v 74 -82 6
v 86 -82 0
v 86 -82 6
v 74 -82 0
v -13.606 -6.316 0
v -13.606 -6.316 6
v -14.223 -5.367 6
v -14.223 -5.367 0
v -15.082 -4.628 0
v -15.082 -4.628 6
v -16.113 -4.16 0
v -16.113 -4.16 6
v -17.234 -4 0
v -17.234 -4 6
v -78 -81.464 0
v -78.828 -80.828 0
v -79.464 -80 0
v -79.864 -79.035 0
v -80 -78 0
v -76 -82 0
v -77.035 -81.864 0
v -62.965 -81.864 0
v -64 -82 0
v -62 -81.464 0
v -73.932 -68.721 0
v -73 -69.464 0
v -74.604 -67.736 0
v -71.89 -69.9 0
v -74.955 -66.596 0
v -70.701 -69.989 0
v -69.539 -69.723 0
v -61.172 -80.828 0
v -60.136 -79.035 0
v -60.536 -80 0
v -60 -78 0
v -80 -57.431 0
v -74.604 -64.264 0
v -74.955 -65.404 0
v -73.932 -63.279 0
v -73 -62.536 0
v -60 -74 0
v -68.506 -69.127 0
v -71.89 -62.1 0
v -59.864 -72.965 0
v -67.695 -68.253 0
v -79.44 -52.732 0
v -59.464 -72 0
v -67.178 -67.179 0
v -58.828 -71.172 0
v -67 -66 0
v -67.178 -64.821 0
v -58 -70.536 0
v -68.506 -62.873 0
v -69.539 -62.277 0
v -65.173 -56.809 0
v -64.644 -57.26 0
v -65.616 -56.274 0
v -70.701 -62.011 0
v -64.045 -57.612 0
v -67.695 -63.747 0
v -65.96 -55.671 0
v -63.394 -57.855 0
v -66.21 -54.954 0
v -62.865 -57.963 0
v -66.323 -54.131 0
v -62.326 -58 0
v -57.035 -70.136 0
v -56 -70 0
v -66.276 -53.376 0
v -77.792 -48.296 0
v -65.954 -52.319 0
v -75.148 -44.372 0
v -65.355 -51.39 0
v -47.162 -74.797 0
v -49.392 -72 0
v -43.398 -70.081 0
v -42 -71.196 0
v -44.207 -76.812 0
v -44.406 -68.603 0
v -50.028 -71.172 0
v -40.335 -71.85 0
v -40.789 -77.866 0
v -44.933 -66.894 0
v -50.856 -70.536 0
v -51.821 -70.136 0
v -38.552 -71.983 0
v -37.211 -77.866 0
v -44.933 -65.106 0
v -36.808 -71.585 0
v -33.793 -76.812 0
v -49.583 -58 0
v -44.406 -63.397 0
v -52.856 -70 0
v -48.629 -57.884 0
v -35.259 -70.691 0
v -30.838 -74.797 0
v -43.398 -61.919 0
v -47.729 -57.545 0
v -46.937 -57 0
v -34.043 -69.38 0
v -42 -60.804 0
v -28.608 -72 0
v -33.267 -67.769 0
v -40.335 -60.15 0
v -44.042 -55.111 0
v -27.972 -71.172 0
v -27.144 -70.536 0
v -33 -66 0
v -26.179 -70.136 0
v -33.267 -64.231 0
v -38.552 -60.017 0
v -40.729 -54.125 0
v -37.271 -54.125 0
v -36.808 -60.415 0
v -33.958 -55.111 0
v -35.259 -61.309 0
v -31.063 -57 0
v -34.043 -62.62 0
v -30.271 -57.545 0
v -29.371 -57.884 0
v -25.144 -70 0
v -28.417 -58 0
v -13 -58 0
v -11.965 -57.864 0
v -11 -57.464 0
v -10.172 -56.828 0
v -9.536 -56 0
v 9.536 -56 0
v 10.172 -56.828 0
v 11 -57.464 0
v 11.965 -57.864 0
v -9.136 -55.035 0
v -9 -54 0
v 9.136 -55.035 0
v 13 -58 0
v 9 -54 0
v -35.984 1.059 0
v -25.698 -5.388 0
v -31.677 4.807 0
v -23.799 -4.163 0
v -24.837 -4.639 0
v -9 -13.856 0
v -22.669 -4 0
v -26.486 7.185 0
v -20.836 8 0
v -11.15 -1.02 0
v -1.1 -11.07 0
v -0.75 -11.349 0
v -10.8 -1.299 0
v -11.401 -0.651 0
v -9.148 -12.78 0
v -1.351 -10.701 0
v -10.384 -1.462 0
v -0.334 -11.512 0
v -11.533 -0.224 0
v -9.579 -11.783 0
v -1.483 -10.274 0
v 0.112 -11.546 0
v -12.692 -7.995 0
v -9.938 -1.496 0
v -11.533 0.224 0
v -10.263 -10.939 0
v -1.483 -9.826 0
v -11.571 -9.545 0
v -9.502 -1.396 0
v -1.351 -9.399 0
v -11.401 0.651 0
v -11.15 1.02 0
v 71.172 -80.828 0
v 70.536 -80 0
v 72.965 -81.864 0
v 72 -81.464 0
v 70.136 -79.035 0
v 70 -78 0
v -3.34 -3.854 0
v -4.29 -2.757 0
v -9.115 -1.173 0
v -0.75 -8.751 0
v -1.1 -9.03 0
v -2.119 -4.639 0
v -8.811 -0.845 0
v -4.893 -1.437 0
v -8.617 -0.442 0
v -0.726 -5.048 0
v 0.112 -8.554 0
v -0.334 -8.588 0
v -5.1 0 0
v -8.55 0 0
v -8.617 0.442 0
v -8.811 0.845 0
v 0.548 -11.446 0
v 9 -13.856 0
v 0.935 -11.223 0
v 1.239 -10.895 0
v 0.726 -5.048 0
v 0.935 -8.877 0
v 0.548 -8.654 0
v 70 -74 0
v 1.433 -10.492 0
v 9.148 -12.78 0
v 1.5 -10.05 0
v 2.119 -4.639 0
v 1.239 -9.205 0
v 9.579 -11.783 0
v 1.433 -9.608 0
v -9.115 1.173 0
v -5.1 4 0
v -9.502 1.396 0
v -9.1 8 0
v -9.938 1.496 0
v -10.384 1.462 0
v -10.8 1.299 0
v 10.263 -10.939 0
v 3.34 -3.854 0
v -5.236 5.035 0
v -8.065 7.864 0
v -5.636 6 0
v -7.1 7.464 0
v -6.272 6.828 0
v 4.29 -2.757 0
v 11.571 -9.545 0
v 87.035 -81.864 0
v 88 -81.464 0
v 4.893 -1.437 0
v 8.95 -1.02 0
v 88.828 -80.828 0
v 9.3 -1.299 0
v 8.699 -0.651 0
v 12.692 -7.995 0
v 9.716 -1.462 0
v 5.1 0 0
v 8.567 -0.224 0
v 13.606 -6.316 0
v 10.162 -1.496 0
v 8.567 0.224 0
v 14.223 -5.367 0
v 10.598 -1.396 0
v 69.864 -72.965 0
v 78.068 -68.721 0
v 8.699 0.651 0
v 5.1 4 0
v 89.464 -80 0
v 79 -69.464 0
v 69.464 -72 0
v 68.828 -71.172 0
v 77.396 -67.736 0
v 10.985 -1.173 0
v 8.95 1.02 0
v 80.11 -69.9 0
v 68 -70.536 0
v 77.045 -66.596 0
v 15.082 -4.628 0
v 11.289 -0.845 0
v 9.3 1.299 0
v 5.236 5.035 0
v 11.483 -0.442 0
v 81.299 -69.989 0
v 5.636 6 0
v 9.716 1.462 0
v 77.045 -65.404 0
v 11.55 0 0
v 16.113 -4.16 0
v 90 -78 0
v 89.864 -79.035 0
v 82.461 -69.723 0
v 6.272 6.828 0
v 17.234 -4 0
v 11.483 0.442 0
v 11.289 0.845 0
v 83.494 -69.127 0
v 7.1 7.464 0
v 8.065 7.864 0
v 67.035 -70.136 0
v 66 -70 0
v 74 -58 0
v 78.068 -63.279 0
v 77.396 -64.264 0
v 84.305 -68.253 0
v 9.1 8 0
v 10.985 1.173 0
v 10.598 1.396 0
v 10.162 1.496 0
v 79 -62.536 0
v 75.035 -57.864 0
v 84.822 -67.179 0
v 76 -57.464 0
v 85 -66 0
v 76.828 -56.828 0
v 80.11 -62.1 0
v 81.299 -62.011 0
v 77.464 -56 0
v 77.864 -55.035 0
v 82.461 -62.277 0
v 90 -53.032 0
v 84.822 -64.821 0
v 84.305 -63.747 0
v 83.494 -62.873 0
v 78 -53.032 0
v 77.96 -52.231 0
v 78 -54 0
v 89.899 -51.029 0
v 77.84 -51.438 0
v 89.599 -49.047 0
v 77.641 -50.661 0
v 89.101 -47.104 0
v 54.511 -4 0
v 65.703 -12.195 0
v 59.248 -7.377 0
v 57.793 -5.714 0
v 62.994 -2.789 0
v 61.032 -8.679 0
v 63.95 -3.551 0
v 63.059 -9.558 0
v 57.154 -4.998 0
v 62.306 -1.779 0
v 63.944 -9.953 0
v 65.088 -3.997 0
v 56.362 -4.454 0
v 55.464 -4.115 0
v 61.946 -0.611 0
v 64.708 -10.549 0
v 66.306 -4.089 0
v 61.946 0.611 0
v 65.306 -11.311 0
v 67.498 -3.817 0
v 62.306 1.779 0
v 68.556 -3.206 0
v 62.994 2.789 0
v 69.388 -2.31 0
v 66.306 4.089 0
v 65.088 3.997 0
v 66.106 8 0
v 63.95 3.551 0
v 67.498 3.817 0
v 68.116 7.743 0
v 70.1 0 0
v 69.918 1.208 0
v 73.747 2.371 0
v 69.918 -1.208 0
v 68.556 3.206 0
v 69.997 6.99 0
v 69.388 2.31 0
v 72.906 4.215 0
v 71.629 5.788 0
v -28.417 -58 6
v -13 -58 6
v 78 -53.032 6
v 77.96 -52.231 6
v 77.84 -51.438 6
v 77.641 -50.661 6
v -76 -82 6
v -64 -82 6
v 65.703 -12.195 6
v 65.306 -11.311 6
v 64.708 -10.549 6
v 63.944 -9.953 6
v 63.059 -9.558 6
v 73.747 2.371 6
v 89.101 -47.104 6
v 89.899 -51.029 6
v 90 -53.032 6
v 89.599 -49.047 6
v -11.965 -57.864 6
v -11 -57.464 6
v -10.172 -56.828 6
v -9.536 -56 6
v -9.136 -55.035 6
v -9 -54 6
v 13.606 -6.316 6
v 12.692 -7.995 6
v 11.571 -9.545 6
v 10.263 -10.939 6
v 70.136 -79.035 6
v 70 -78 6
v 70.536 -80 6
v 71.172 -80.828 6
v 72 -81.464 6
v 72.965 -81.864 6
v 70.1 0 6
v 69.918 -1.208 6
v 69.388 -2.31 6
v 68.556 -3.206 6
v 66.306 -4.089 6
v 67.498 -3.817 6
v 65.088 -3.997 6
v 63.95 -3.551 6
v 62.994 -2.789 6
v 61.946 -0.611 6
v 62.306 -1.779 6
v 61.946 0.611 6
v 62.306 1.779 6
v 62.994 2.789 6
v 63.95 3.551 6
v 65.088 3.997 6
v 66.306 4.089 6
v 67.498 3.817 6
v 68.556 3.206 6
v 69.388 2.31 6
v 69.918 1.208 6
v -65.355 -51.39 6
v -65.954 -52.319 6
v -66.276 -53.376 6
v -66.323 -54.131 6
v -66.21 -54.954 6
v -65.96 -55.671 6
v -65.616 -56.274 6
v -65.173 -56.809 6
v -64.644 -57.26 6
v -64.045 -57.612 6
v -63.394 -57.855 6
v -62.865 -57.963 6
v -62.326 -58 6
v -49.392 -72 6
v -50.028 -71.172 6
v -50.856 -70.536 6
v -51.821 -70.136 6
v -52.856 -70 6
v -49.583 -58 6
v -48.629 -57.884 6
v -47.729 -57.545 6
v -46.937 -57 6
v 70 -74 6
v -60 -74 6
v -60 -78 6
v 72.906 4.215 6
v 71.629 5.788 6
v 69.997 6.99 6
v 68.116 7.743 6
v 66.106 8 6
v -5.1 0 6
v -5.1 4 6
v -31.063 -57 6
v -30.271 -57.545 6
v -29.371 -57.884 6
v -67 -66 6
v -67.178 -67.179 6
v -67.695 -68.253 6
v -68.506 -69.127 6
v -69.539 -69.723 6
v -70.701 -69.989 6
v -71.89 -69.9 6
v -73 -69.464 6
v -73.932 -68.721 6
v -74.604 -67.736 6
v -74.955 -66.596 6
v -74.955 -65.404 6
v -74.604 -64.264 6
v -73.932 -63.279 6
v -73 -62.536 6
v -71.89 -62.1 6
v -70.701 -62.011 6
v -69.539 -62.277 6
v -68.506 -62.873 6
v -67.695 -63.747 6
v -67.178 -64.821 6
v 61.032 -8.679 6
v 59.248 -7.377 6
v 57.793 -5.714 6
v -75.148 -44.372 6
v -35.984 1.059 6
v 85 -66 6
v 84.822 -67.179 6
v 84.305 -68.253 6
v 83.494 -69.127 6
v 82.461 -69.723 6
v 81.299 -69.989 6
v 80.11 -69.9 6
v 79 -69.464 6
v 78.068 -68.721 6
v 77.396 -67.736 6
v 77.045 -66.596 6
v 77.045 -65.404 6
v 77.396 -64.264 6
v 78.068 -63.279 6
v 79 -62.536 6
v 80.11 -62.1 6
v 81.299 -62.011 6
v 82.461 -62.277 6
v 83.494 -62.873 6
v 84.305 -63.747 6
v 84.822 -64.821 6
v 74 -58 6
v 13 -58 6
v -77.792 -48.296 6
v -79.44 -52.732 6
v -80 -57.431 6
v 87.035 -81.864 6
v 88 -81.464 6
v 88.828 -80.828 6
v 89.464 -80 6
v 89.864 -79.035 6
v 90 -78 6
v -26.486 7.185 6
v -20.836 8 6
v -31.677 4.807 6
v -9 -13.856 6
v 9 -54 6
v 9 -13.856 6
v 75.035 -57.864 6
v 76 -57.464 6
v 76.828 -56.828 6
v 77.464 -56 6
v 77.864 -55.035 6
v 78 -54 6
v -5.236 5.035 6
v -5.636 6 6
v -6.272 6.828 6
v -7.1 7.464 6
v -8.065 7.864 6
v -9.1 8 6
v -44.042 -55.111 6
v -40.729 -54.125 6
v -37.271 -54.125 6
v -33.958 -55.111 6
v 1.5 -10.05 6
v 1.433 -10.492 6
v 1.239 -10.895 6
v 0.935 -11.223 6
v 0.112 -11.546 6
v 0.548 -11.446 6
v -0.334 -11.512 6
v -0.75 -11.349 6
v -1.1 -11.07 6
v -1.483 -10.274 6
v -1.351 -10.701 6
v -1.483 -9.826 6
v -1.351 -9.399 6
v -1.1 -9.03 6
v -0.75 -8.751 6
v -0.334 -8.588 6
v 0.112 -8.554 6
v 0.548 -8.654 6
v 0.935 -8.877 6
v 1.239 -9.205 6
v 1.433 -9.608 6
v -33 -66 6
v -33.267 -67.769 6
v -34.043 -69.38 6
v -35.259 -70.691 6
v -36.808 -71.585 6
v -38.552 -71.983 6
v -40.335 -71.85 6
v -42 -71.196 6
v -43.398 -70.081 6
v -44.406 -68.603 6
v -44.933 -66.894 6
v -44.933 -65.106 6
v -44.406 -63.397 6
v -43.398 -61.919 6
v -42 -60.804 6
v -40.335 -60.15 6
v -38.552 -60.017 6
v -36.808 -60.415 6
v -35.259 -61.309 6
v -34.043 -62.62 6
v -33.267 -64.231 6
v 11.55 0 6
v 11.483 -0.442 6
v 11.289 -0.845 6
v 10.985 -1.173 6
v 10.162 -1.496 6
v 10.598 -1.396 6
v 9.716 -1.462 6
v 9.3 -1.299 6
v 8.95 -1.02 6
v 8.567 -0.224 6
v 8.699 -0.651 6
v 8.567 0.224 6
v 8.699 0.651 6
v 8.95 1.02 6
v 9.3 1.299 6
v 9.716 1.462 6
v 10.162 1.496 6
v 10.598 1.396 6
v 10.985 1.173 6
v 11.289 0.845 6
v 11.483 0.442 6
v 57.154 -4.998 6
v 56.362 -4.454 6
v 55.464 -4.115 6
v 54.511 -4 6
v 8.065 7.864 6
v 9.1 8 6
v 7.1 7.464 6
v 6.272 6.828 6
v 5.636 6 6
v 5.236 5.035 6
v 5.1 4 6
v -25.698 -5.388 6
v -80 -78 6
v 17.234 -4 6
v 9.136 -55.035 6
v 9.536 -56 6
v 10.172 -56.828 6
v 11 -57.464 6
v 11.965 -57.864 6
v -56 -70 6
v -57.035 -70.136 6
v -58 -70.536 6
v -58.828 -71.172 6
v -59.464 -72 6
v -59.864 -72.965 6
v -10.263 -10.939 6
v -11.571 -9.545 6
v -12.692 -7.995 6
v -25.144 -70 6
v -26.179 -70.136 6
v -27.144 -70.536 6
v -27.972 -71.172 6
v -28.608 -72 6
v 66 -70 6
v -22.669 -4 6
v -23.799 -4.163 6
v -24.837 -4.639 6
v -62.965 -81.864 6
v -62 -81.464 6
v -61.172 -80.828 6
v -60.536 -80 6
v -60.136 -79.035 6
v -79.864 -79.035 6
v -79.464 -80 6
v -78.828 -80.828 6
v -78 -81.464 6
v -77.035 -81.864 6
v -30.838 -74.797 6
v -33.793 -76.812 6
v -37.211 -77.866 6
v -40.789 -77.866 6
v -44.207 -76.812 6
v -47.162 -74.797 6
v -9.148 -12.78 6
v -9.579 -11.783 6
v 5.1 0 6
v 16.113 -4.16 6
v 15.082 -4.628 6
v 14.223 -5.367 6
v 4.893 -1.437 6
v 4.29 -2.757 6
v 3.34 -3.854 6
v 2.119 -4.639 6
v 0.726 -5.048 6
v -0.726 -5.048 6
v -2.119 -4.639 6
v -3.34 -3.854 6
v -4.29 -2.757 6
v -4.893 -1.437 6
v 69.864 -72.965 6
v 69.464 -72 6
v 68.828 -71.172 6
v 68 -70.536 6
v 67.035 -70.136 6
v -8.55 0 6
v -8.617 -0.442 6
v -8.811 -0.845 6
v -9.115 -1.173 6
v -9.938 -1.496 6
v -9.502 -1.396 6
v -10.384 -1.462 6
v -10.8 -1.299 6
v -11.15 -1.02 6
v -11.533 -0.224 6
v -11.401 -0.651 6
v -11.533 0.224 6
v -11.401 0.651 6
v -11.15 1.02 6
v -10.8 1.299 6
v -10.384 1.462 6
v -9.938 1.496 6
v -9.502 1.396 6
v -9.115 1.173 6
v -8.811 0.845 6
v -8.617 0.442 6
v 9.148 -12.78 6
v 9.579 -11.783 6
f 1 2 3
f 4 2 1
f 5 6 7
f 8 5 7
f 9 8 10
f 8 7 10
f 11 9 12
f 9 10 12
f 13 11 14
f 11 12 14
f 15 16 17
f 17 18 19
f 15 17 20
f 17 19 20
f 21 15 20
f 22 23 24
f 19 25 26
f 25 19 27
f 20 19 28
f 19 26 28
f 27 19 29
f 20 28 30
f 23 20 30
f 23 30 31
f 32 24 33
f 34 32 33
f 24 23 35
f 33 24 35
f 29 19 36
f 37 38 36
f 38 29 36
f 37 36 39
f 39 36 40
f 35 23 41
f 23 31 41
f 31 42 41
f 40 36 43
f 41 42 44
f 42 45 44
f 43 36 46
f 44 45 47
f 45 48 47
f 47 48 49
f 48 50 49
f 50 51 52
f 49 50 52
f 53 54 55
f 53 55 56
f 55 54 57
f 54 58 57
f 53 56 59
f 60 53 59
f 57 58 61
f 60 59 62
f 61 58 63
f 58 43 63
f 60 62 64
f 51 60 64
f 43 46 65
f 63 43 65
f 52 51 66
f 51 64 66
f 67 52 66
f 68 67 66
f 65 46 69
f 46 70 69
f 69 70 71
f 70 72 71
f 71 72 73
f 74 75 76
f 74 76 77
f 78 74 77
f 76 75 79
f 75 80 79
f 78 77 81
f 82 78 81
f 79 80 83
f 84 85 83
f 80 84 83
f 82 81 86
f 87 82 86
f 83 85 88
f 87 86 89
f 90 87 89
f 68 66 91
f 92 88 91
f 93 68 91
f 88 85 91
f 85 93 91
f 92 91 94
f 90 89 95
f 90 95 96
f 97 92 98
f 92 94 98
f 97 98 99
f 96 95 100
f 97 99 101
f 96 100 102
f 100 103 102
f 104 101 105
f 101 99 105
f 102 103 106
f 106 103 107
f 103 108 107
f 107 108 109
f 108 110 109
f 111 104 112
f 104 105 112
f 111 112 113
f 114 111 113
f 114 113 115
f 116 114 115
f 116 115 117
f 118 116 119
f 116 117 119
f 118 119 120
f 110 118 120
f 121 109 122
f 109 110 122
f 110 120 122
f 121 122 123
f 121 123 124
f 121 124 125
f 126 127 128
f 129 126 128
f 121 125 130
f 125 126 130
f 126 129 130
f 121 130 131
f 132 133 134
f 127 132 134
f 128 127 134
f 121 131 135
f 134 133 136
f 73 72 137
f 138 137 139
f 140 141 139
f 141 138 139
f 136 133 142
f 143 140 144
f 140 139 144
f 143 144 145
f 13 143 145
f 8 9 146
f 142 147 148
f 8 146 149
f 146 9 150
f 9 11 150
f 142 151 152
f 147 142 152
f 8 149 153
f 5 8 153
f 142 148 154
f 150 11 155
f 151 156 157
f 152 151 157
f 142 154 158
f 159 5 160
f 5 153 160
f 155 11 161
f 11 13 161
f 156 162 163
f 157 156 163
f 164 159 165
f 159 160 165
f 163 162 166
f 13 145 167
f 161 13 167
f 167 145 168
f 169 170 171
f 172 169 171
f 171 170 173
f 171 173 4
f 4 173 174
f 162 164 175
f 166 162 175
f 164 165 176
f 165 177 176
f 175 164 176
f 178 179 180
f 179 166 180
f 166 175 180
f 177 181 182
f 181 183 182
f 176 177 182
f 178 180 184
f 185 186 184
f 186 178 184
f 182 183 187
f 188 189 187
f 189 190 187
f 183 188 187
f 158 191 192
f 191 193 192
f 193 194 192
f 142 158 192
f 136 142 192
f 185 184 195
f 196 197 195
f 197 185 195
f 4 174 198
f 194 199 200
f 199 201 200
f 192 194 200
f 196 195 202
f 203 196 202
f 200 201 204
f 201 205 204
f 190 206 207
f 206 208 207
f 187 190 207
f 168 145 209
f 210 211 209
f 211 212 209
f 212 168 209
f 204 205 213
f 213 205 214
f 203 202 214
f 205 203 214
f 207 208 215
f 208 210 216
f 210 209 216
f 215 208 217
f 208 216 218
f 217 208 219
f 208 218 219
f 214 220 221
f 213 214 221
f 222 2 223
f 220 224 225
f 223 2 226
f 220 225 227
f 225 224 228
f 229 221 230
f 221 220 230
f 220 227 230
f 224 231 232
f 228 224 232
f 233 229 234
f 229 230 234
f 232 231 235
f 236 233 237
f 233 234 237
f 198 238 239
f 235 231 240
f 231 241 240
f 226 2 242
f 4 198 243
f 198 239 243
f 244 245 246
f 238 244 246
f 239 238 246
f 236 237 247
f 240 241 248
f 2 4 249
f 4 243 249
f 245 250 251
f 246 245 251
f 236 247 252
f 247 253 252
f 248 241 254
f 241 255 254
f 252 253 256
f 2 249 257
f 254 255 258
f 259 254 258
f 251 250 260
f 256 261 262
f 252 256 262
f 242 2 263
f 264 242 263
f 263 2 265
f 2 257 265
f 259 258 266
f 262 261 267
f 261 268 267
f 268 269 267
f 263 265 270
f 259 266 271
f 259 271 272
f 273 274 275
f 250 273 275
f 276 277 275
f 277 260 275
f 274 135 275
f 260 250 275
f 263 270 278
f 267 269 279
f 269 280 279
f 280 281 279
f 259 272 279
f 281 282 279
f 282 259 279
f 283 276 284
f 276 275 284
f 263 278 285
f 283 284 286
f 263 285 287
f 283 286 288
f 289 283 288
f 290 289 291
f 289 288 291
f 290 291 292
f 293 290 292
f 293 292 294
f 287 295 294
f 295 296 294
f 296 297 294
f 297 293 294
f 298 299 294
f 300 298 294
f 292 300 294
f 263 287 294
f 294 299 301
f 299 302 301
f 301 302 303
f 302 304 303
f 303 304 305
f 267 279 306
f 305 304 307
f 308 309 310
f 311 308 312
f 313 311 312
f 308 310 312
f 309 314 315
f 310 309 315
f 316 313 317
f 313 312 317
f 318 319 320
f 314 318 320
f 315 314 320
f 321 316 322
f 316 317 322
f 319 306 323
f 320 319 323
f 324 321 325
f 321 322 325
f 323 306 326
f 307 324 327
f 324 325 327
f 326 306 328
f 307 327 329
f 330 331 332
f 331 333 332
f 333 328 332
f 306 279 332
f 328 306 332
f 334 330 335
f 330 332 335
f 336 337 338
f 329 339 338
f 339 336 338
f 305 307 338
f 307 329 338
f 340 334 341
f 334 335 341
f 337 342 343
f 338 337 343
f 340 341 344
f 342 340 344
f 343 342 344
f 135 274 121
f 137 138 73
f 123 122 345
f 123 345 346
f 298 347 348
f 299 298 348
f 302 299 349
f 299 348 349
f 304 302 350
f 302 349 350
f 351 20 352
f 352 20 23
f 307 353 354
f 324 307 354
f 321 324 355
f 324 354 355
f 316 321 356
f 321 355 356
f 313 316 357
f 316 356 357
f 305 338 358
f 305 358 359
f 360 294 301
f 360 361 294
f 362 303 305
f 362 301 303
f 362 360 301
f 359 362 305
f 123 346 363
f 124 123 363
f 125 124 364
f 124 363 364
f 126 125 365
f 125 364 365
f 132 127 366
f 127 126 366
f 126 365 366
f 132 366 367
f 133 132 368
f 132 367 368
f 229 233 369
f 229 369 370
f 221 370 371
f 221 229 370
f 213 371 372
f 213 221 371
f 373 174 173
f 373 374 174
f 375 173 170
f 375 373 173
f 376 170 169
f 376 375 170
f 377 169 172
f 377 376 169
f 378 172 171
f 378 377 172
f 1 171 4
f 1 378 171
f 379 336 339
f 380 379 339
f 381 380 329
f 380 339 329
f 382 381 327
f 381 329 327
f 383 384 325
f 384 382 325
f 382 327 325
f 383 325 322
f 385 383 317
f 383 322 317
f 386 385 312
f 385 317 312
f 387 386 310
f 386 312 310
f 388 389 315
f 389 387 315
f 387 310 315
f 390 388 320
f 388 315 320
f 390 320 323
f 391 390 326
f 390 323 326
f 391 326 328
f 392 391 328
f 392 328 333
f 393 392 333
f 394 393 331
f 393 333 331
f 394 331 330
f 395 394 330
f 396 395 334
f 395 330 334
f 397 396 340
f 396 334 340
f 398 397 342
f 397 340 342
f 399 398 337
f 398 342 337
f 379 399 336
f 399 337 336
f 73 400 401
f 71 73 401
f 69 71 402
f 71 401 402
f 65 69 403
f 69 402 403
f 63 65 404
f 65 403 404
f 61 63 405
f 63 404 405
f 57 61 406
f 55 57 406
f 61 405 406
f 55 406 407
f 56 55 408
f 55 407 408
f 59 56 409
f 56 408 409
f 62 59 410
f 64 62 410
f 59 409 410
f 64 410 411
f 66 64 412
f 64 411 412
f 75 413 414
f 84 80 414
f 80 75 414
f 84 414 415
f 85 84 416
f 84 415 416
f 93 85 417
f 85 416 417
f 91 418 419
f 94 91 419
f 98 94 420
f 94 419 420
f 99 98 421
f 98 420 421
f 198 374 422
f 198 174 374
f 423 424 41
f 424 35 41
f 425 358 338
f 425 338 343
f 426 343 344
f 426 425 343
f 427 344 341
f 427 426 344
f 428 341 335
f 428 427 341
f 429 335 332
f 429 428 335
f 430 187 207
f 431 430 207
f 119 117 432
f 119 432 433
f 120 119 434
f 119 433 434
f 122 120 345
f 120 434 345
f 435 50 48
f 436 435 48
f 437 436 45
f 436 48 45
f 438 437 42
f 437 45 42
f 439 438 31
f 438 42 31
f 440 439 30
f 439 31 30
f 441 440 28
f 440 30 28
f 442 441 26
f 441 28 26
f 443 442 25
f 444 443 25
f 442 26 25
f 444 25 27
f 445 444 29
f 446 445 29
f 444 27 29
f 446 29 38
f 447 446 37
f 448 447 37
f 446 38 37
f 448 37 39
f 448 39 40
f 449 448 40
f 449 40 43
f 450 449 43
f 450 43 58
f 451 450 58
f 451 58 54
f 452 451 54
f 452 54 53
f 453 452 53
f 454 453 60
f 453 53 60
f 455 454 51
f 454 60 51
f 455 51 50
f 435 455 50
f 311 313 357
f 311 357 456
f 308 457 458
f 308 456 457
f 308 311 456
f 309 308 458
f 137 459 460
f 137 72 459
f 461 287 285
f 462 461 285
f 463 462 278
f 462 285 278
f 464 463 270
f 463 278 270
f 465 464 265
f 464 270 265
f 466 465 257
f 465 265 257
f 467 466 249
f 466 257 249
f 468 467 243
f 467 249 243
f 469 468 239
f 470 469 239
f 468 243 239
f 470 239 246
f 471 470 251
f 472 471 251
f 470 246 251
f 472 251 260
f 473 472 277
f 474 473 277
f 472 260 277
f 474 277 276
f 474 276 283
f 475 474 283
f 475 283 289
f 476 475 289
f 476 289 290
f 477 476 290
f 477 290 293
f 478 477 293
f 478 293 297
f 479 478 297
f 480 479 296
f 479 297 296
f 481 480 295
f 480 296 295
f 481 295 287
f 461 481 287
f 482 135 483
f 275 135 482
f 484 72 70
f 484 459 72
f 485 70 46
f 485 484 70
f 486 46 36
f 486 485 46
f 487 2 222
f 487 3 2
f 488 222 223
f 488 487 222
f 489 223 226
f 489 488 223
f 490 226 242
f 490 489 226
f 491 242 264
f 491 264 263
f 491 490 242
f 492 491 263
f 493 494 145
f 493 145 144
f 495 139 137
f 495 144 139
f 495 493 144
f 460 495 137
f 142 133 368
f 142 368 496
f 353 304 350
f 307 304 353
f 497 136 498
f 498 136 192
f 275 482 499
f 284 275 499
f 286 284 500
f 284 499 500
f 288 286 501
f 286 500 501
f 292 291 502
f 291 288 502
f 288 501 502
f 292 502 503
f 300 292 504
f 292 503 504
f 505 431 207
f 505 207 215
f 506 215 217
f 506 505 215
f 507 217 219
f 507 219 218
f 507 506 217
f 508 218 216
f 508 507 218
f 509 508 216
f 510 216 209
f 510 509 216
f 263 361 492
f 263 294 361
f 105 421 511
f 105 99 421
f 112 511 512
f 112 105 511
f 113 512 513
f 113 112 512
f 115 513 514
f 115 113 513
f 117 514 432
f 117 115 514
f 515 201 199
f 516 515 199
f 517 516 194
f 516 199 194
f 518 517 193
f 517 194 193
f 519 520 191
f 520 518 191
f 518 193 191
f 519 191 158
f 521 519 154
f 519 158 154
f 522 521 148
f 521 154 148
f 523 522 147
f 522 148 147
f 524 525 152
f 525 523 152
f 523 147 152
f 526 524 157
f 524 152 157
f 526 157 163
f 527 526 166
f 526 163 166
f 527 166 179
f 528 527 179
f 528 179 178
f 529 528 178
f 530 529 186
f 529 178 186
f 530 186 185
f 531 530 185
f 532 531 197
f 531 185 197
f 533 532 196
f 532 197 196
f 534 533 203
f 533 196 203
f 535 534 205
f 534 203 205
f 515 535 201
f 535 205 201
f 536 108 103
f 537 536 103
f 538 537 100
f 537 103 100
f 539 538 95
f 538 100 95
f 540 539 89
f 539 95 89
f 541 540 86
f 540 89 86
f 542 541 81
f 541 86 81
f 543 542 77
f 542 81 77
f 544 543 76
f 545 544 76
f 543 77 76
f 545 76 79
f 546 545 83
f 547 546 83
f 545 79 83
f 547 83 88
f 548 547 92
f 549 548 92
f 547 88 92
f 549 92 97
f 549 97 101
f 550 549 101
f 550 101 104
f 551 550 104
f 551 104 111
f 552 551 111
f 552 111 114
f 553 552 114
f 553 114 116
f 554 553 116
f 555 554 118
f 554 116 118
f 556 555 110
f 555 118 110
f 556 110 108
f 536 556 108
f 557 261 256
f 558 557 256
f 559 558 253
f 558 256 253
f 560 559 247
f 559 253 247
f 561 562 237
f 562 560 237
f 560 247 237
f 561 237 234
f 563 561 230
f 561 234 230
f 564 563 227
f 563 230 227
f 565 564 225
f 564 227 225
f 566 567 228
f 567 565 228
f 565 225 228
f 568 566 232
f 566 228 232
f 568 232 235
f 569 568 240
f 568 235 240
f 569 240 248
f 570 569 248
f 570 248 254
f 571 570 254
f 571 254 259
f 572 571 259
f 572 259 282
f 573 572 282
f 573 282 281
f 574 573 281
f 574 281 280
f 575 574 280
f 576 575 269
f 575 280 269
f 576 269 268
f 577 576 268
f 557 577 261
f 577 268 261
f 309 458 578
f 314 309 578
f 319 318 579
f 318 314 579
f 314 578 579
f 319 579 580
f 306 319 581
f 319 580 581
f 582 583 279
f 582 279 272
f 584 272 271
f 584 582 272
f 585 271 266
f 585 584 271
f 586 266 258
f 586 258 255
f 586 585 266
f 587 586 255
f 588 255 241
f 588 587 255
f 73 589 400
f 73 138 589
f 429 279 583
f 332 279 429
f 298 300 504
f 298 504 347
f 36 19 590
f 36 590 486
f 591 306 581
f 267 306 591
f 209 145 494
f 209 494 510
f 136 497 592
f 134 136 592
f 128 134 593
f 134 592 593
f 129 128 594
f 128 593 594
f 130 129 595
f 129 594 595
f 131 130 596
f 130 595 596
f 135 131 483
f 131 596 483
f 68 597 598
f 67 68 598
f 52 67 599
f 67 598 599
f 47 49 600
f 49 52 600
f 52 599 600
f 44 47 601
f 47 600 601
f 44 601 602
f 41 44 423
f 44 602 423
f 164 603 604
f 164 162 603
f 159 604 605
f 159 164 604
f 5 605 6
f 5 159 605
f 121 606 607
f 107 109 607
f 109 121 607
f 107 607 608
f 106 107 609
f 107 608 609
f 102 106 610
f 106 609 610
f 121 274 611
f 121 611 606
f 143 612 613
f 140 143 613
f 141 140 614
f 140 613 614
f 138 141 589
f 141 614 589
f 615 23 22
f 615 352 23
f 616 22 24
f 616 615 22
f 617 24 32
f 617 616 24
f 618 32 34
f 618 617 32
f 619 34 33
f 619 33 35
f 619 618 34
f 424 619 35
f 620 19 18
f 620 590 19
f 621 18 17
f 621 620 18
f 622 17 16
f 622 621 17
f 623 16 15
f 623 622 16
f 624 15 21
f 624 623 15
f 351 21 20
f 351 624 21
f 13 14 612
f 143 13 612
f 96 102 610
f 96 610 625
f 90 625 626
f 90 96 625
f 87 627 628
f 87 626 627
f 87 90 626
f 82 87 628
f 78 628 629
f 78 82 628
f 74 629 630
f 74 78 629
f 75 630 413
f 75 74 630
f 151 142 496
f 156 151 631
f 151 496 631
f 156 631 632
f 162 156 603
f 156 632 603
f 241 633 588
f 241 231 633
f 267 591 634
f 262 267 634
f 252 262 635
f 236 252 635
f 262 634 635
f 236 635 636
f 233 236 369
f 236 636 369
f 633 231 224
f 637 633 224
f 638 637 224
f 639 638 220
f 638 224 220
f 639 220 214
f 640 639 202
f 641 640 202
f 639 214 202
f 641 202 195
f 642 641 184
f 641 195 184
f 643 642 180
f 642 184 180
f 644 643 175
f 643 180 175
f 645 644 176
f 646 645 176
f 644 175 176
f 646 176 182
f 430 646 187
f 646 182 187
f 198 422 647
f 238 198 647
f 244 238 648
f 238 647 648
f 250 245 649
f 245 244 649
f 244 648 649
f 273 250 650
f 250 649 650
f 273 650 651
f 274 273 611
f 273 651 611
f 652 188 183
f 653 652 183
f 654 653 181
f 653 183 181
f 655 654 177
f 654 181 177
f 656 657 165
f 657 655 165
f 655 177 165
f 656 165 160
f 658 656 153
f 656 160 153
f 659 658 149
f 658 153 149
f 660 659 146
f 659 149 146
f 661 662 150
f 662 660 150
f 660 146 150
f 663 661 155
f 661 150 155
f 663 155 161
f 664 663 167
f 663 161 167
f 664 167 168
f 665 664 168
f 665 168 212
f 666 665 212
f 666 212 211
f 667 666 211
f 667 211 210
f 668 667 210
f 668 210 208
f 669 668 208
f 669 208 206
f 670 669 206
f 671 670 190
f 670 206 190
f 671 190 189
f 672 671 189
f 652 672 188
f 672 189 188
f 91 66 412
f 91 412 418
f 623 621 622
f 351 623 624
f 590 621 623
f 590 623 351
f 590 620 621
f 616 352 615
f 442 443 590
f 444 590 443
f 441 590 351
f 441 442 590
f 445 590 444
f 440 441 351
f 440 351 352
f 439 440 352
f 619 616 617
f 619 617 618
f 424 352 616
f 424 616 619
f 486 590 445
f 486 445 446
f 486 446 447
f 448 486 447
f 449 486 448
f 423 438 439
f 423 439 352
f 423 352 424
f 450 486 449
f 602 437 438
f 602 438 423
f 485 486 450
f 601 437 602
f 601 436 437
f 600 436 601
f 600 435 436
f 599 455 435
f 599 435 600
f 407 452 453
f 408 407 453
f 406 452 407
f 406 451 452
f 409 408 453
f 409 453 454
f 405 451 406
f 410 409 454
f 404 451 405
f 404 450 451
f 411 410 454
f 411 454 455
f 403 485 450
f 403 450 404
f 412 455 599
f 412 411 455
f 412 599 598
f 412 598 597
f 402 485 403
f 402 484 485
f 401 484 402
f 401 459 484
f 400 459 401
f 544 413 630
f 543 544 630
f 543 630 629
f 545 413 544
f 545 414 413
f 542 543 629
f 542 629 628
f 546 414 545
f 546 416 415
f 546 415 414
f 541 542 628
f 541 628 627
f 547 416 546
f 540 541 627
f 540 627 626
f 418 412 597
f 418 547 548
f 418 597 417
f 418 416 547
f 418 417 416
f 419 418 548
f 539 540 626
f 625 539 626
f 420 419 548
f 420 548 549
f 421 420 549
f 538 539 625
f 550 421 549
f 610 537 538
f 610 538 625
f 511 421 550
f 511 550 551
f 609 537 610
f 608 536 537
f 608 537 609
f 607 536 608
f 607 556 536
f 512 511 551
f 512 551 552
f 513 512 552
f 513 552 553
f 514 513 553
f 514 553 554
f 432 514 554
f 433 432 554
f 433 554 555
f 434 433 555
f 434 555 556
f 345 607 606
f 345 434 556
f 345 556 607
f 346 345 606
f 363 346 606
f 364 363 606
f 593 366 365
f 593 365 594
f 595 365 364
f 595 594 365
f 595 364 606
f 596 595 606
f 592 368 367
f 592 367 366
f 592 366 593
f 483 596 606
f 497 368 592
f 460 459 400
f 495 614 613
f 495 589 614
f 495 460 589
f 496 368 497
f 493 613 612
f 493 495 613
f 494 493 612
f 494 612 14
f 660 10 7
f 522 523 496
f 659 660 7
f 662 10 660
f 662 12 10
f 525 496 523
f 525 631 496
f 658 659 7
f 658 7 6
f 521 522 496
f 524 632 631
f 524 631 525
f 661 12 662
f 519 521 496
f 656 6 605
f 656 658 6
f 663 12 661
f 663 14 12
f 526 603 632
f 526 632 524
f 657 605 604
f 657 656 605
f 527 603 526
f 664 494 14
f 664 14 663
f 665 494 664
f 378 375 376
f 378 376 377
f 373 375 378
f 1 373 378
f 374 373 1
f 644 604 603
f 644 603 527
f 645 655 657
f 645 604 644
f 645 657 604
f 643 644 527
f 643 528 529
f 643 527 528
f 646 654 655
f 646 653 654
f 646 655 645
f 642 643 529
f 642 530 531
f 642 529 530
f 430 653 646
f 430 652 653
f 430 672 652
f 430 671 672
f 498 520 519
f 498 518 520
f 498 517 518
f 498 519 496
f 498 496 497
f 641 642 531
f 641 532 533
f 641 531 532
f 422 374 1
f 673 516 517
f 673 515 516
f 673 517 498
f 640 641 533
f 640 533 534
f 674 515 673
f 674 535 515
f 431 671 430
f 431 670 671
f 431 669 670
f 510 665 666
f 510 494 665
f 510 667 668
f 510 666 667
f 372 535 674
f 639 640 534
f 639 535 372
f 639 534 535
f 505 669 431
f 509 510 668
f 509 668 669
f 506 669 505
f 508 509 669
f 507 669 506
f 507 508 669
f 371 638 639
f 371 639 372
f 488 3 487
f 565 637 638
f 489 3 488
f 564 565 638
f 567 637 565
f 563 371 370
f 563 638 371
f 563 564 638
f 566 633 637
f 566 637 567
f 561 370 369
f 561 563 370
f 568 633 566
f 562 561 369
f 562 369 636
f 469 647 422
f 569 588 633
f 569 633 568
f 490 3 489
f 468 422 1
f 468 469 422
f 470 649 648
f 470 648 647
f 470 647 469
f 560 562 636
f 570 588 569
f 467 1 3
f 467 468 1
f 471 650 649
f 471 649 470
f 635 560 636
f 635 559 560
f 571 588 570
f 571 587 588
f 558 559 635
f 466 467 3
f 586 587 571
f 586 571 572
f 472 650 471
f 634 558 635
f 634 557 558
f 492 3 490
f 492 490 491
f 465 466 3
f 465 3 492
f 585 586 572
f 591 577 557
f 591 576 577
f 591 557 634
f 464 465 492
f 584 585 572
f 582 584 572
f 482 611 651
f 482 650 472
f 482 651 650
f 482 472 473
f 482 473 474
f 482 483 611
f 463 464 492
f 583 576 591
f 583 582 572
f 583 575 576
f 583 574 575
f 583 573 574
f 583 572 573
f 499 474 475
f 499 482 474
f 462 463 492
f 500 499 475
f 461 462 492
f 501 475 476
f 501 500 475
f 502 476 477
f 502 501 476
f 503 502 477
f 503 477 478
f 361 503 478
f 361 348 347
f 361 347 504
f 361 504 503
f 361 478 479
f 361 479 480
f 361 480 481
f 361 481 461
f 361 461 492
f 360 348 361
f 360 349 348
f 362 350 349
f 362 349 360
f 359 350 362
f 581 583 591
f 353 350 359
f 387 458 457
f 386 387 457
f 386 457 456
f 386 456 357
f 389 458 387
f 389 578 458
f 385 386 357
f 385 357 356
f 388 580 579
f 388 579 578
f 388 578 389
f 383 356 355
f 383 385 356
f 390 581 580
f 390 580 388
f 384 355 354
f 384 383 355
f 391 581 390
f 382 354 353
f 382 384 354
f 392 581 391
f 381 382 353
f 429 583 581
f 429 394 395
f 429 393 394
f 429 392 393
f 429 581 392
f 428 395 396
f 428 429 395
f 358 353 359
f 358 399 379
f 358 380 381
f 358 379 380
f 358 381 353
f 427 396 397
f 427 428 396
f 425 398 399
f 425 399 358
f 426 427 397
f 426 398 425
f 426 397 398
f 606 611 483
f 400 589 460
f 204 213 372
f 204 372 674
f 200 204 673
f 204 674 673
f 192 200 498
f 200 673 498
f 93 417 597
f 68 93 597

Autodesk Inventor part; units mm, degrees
ref_plane "YZ Plane" through (0, 0, 0) normal (1, 0, 0) x (0, 1, 0)
ref_plane "XZ Plane" through (0, 0, 0) normal (0, 1, 0) x (-1, 0, 0)
ref_plane "XY Plane" through (0, 0, 0) normal (0, 0, 1) x (1, 0, 0)
sketch "Эскиз1" plane through (0, 0, 0) normal (0, 0, 1) x (1, 0, 0)
  circle A0 centre (0, 0) radius 60 construction
  line L0 (-80, -70) -> (-80, -50)
  line L1 (-80, -50) -> (-30, 8)
  line L2 (-30, 8) -> (72, 8)
  line L3 (72, 8) -> (90, -50)
  line L4 (90, -50) -> (90, -70)
  line L5 (90, -70) -> (-80, -70)
  line L6 (0, -110.4) -> (0, 88.4) construction
  line L7 (-115.4, 0) -> (132.4, 0) construction
  line L8 (-80, -50) -> (90, -50) construction
  circle A1 centre (67, -35) radius 12.5 construction
  circle A2 centre (0, 0) radius 5.1
  circle A3 centre (66, 0) radius 4.1
  circle A4 centre (67, -35) radius 4
  circle A5 centre (67, -35) radius 8.5 construction
  line L9 (67, -49.1463) -> (67, -22.5) construction
  circle A6 centre (67, -43.5) radius 1.6
  circle A7 centre (67, -26.5) radius 1.6
  line L10 (-24.5014, -4) -> (-68, -54.4584)
  line L11 (-68, -54.4584) -> (-68, -58)
  line L12 (-68, -58) -> (78, -58)
  line L13 (78, -58) -> (78, -51.8193)
  line L14 (78, -51.8193) -> (63.1595, -4)
  line L15 (63.1595, -4) -> (-24.5014, -4)
  arc A8 (-3.5925, -14.5634) -> (14.4568, -4) centre (0, 0) ccw
  arc A9 (-14.4568, -4) -> (-3.5925, -14.5634) centre (0, 0) ccw
  arc A10 (14.4568, -4) -> (-14.4568, -4) centre (0, 0) ccw construction
  line L16 (-9, -58) -> (-9, -12)
  line L17 (9, -58) -> (9, -12)
  arc A11 (65.0062, -9.9505) -> (56.8348, -4) centre (66, 0) ccw construction
  line L18 (68.4354, -21) -> (58.4354, -21)
  line L19 (58.4354, -21) -> (47.8258, -58)
  arc A12 (56.8348, -4) -> (65.0062, -9.9505) centre (66, 0) ccw
  line L20 (-80, -70) -> (-80, -82)
  line L21 (-80, -82) -> (-60, -82)
  line L22 (-60, -82) -> (-60, -70)
  line L23 (90, -70) -> (90, -82)
  line L24 (90, -82) -> (70, -82)
  line L25 (70, -82) -> (70, -70)
  circle A13 centre (-71, -66) radius 4
  circle A14 centre (81, -66) radius 4
  line L26 (-80, -66) -> (90, -66) construction
  line L27 (-5.1, 0) -> (-5.1, 8)
  line L28 (5.1, 0) -> (5.1, 8)
  circle A15 centre (37.4657, -40.2656) radius 6
  circle A16 centre (37.4657, -40.2656) radius 12
  circle A17 centre (67, -35) radius 30 construction
  circle A18 centre (0, 0) radius 55 construction
  line L29 (9, -40.2656) -> (74.4144, -40.2656) construction
  line L30 (9, -47.2656) -> (50.9039, -47.2656)
  line L31 (9, -33.2656) -> (54.9183, -33.2656)
  line L32 (69.7458, -32.0913) -> (70, -32.0913)
  circle A19 centre (0, 0) radius 10.05 construction
  circle A20 centre (-10.05, 0) radius 1.5
  circle A21 centre (10.05, 0) radius 1.5
  circle A22 centre (0, -10.05) radius 1.5
  circle A23 centre (-39, -66) radius 12
  circle A24 centre (-39, -66) radius 6
  point P0 (56.8348, -4)
  point P1 (65.0062, -9.9505)
  point P2 (59.5152, -7.6123)
  point P3 (27.7189, -33.2656)
  point P4 (27.7189, -47.2656)
  point P5 (47.2125, -47.2656)
  point P6 (47.2125, -33.2656)
  point P7 (3.1639, -4)
  point P8 (-3.1639, -4)
  point P9 (-27.6863, -70)
  point P10 (-50.3137, -70)
  point P11 (-30.0557, -58)
  point P12 (-47.9443, -58)
  dimension "d0" = 120
  dimension "d1" = 25
  dimension "d14" = 8
  dimension "d44" = 60
  dimension "d45" = 110
  dimension "d2" = 10.2
  dimension "d3" = 8
  dimension "d5" = 20
  dimension "d6" = 70
  dimension "d8" = 30
  dimension "d9" = 72
  dimension "d10" = 8.2
  dimension "d11" = 66
  dimension "d12" = 80
  dimension "d13" = 90
  dimension "d15" = 35
  dimension "d17" = 17
  dimension "d19" = 3.2
  dimension "d20" = 67
  dimension "d25" = 12
  dimension "d26" = 30
  dimension "d27" = 9
  dimension "d28" = 9
  dimension "d29" = 20
  dimension "d31" = 21
  dimension "d32" = 106
  dimension "d33" = 10
  dimension "d35" = 20
  dimension "d36" = 12
  dimension "d37" = 8
  dimension "d38" = 8
  dimension "d39" = 16
  dimension "d40" = 9
  dimension "d41" = 9
  dimension "d42" = 12
  dimension "d43" = 24
  dimension "d47" = 7
  dimension "d48" = 7
  dimension "d52" = 3
  dimension "d53" = 3
  dimension "d54" = 3
  dimension "d55" = 20.1
  dimension "d56" = 24
  dimension "d57" = 12
  dimension "d58" = 32
extrude "Выдавливание1" add sketch "Эскиз1" along normal blind 6 contours L0 L1 L2 L27 A2 L15 L10 L11 L12 A23 L5 | L5 L22 L21 L20 | A23 L12 L5 A24 | L5 A24 A23 | L2 L3 L4 L5 A23 L12 L13 L14 L15 A2 L28 | A23 L12 | A2 L15 A8 A9 | L5 L23 L24 L25 | L16 A9 A8 L17 L12 | L15 L14 A12
fillet "Сопряжение1" radius 4 24 edges at (9, -12, 3) (-24.5014, -4, 3) (-9, -58, 3) (-68, -54.4584, 3) (-68, -58, 3) (9, -58, 3) (56.8348, -4, 3) (65.0062, -9.9505, 3) (-80, -82, 3) (-60, -82, 3) (-60, -70, 3) (70, -70, 3) (70, -82, 3) (90, -82, 3) (5.1, 8, 3) (-5.1, 8, 3) (78, -58, 3) (-14.4568, -4, 3) (-9, -12, 3) (14.4568, -4, 3) (-47.9443, -58, 3) (-30.0557, -58, 3) (-50.3137, -70, 3) (-27.6863, -70, 3)
fillet "Сопряжение1" radius 20 3 edges at (-80, -50, 3) (-30, 8, 3) (90, -50, 3)
fillet "Сопряжение1" radius 8 2 edges at (72, 8, 3) (78, -51.8193, 3)
equation "\"d28\" = d27"
properties part number "Опора катушки (врунтренняя)"
